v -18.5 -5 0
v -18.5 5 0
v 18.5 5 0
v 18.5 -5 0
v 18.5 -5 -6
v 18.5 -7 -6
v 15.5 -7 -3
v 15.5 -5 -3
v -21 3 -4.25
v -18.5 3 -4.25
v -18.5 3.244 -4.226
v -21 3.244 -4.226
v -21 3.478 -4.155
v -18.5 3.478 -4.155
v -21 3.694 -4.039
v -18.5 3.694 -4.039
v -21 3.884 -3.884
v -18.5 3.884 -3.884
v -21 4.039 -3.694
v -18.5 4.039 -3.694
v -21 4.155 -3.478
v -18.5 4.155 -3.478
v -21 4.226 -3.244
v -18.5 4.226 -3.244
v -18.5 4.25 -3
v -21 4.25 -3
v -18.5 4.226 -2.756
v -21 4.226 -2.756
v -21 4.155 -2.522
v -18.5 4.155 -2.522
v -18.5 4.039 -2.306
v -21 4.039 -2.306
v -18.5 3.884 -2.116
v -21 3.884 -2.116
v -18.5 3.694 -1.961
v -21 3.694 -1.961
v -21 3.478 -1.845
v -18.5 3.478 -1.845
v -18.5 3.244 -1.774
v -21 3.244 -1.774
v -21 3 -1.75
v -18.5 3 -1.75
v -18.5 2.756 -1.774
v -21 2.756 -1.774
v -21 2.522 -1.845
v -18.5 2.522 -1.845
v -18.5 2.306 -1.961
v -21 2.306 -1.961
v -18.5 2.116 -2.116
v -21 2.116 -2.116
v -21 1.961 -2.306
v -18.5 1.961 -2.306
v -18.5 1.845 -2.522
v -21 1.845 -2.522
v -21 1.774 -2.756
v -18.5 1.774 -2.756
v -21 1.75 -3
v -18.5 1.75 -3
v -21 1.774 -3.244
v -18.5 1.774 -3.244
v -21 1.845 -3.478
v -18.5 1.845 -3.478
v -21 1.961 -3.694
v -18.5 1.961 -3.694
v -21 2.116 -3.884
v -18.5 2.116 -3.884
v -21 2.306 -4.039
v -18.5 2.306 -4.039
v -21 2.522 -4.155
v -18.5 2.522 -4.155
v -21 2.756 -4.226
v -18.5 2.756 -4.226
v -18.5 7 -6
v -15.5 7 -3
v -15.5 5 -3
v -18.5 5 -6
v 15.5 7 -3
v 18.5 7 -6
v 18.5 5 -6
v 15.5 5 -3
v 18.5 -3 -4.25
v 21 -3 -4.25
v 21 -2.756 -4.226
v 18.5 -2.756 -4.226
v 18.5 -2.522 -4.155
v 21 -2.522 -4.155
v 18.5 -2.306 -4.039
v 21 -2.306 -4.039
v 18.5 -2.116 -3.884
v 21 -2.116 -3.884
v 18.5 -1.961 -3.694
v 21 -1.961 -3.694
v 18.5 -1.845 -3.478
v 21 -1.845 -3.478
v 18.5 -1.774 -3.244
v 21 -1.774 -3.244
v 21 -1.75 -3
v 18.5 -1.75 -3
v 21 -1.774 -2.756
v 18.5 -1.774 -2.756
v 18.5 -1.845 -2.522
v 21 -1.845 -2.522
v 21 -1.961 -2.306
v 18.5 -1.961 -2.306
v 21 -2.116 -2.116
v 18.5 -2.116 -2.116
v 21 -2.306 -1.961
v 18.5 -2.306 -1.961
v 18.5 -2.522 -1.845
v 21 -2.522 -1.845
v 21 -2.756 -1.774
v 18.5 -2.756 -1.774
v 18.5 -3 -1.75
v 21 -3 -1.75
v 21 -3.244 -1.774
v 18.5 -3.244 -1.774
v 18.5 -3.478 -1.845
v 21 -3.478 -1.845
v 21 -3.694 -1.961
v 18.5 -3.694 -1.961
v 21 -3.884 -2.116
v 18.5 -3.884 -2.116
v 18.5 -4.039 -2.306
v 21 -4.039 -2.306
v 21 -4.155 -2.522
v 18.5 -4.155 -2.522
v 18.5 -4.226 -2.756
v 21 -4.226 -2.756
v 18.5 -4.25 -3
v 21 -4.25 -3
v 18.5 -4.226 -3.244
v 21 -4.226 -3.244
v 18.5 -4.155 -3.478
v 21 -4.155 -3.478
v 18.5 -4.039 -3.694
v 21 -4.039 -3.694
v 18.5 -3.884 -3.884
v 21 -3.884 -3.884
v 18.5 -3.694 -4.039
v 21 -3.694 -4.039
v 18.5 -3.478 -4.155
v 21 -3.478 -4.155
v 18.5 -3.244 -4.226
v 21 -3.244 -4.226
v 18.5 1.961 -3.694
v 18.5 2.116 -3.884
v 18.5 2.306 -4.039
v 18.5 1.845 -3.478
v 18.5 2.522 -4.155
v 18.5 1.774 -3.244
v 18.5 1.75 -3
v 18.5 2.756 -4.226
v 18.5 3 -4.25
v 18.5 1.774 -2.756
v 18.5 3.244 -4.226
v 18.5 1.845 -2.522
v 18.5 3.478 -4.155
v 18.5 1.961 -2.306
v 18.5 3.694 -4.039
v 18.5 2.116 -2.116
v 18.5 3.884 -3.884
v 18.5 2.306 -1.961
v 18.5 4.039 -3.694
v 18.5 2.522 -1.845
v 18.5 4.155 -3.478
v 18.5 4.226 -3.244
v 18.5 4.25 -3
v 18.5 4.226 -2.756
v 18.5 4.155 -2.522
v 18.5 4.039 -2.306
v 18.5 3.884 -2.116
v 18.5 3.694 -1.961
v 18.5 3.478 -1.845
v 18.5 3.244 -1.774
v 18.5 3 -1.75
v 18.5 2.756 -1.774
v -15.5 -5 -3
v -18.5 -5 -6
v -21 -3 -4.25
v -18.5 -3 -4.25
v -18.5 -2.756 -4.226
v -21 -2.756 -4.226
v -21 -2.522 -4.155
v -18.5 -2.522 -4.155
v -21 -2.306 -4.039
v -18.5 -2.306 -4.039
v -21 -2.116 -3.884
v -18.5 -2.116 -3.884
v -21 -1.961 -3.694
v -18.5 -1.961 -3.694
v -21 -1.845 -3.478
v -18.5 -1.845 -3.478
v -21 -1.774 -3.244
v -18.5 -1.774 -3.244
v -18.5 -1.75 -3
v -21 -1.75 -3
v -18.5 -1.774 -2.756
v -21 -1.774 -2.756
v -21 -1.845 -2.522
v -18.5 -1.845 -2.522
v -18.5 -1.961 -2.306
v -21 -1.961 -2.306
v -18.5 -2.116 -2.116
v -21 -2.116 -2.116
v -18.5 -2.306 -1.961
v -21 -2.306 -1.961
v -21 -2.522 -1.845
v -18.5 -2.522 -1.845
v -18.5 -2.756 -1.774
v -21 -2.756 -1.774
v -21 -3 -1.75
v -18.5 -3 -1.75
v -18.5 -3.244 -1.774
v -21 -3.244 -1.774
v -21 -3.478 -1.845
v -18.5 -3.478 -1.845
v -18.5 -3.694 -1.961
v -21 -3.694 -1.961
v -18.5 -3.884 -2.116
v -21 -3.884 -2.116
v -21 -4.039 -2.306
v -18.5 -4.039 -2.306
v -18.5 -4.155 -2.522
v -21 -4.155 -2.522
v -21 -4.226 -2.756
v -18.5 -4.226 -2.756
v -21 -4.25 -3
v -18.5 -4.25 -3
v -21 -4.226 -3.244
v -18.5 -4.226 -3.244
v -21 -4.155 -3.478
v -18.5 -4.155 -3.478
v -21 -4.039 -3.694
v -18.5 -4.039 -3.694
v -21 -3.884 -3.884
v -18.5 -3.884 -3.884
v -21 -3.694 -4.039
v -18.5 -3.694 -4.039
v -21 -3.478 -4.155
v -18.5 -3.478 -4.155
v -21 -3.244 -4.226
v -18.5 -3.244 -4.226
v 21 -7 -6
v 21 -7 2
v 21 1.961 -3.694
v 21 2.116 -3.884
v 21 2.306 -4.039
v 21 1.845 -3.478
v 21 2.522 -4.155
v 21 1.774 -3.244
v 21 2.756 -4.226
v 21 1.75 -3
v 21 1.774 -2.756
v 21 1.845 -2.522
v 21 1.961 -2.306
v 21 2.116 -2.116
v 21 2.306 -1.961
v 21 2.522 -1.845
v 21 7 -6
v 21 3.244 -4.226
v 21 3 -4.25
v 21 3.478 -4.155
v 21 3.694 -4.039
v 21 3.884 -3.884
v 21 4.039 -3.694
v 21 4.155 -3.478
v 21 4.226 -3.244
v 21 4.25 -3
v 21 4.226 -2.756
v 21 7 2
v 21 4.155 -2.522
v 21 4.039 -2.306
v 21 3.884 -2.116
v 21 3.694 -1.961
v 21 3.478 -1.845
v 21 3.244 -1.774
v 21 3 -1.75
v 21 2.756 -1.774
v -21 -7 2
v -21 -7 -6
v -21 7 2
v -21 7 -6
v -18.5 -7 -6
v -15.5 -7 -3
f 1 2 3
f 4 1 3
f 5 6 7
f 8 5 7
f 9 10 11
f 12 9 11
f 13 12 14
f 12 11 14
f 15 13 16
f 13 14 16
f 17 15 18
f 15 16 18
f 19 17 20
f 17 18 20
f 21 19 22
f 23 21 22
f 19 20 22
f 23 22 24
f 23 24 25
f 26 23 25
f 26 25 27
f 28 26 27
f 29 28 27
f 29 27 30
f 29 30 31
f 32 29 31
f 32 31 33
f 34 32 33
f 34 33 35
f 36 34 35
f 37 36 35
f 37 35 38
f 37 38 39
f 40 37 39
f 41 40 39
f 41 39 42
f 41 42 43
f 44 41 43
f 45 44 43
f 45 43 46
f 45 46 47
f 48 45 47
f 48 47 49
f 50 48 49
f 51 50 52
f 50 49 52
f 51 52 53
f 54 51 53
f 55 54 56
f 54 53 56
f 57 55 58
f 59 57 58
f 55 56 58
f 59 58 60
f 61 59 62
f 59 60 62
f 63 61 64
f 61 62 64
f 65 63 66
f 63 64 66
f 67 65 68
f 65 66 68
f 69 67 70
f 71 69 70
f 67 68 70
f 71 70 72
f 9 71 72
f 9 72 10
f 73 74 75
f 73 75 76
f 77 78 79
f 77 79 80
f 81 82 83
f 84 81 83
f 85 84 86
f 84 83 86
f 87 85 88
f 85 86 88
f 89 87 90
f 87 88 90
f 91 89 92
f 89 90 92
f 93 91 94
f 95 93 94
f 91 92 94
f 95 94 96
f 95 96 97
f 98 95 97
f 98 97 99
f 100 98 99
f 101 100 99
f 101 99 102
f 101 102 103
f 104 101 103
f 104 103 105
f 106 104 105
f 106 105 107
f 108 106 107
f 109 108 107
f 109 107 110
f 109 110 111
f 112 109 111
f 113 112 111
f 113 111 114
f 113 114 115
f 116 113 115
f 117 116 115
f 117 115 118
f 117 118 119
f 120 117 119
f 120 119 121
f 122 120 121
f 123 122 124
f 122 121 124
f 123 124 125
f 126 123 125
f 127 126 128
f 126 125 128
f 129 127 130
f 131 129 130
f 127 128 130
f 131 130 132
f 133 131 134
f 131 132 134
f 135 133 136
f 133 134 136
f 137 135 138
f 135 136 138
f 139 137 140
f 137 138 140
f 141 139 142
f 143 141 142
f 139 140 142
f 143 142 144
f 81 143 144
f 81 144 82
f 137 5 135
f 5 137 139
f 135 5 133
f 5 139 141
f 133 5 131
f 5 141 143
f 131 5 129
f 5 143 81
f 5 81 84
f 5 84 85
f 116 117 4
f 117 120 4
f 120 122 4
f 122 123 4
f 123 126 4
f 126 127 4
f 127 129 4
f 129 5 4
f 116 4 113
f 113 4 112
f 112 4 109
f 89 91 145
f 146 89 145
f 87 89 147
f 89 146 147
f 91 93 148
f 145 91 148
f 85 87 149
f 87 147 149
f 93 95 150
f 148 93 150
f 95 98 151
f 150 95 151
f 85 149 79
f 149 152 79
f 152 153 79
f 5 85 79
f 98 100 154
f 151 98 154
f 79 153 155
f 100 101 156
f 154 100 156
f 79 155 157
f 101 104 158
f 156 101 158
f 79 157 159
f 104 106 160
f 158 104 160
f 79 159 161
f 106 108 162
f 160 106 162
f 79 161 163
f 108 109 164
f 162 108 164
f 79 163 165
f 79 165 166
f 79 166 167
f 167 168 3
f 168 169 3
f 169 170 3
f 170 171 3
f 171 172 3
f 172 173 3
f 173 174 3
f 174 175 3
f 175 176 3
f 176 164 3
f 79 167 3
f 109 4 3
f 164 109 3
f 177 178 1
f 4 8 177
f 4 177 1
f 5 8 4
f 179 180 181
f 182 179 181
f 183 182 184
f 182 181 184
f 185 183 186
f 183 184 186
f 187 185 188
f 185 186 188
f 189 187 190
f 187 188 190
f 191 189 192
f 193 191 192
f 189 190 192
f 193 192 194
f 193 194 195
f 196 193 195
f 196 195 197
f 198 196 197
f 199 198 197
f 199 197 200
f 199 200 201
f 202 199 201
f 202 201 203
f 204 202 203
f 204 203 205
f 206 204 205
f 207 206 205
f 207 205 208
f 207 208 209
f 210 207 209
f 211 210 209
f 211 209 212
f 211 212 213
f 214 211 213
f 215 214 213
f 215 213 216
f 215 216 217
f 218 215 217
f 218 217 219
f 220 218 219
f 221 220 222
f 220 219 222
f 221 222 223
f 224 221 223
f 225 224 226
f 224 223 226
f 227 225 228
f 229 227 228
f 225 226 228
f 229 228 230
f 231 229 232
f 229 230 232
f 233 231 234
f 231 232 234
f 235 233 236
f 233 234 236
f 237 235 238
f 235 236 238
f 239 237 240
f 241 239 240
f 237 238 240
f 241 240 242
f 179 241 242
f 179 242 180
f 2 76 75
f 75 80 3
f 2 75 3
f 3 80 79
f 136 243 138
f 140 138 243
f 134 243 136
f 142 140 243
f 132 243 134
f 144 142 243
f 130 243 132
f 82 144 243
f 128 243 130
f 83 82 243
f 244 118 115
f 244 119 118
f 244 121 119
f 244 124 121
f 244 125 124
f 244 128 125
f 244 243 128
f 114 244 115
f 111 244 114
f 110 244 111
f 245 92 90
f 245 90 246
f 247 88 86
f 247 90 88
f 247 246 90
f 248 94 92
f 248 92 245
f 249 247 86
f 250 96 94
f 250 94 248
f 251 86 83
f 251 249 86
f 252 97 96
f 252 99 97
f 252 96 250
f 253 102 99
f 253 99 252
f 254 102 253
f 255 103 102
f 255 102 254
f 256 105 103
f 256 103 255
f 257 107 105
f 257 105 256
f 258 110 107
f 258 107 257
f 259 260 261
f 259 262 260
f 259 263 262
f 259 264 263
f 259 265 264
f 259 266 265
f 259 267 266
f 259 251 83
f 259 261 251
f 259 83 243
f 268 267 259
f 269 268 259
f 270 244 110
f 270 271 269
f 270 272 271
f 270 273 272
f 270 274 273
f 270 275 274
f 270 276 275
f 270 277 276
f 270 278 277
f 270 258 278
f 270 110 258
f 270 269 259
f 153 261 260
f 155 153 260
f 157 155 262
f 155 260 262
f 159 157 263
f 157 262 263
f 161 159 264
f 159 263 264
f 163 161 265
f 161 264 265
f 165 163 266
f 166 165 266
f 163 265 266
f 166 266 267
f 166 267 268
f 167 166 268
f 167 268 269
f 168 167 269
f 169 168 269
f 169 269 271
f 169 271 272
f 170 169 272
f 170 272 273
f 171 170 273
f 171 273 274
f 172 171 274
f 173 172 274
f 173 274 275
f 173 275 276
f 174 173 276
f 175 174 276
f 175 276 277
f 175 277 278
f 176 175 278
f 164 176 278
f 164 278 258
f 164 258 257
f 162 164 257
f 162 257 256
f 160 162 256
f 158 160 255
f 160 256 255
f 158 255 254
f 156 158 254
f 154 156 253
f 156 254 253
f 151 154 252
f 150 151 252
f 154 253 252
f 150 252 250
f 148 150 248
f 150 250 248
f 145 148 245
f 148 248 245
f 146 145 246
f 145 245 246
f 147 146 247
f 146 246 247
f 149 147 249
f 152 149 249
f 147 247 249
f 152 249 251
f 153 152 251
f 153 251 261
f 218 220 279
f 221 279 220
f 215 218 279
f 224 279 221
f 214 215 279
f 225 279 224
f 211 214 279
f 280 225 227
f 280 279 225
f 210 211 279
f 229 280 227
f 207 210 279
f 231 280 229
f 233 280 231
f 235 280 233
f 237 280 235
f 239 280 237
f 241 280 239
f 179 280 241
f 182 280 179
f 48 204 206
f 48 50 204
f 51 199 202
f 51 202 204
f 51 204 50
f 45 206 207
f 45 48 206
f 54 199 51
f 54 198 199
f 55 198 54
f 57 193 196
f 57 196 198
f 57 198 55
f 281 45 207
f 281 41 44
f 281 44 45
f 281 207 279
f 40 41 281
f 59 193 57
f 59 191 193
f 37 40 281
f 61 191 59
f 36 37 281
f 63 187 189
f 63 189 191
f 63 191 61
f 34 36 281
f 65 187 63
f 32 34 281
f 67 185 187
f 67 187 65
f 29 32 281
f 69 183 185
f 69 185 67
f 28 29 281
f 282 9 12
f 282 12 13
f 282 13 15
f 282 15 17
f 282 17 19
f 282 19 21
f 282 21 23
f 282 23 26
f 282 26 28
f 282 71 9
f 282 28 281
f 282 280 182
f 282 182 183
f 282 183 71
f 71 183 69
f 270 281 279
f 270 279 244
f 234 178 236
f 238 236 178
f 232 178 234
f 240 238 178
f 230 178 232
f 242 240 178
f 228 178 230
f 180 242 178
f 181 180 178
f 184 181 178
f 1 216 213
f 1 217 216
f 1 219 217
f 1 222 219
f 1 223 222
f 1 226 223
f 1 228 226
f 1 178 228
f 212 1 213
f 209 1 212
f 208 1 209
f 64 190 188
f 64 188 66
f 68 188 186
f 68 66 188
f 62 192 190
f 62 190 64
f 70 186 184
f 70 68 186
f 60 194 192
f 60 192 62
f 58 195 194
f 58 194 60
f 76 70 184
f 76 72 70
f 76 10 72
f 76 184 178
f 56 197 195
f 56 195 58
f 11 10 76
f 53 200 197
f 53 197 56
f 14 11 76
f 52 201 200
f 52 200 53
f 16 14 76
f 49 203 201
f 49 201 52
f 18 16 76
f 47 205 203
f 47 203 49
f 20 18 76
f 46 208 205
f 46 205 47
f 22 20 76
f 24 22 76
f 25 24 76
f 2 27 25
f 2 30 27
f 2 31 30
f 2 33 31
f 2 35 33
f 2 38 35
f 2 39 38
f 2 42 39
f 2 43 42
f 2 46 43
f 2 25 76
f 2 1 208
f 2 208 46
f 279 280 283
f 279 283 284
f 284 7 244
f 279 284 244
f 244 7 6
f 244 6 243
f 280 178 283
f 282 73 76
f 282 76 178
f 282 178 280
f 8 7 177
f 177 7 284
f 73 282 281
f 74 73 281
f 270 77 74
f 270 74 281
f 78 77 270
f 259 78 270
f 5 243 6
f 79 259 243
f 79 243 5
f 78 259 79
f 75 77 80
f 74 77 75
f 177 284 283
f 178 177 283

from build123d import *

# Parameters (mm, degrees)
SKETCH1_W           = 42
SKETCH1_H           = 14
BOSS_EXTRUDE1_DEPTH = 2
SKETCH2_W           = 2.5
SKETCH2_H           = 14
BOSS_EXTRUDE2_DEPTH = 6
SKETCH5_R           = 1.25
CUT_EXTRUDE1_DEPTH  = 43
BOSS_EXTRUDE3_DEPTH = 2


with BuildPart() as part:
    # Sketch1 → Boss-Extrude1 (new body)
    with BuildSketch(Plane.XY):
        Rectangle(SKETCH1_W, SKETCH1_H)
    extrude(amount=BOSS_EXTRUDE1_DEPTH)

    # Sketch2 → Boss-Extrude2 (add)
    with BuildSketch(Plane(origin=(0, 0, 0), x_dir=(-1, 0, 0), z_dir=(0, 0, -1))):
        with Locations((-19.75, 0)):
            Rectangle(SKETCH2_W, SKETCH2_H)
        with Locations((19.75, 0)):
            Rectangle(SKETCH2_W, SKETCH2_H)
    extrude(amount=BOSS_EXTRUDE2_DEPTH)

    # Sketch5 → Cut-Extrude1 (cut, through all)
    with BuildSketch(Plane(origin=(21, 0, 0), x_dir=(0, 0, -1), z_dir=(1, 0, 0))):
        with Locations((3, 3)):
            Circle(SKETCH5_R)
        with Locations((3, -3)):
            Circle(SKETCH5_R)
    extrude(amount=-CUT_EXTRUDE1_DEPTH, mode=Mode.SUBTRACT)

    # Sketch6 → Boss-Extrude3 (add)
    with BuildSketch(Plane(origin=(0, 7, 0), x_dir=(1, 0, 0), z_dir=(0, 1, 0))):
        Polygon((-18.5, 6), (-18.5, 0), (-12.5, 0), (12.5, 0), (18.5, 0), (18.5, 6), (15.5, 3), (-15.5, 3), align=None)
    boss_extrude3 = extrude(amount=-BOSS_EXTRUDE3_DEPTH)

    # Mirror1: Boss-Extrude3 across plane
    add(boss_extrude3.mirror(Plane.ZX))


solid = part.part
